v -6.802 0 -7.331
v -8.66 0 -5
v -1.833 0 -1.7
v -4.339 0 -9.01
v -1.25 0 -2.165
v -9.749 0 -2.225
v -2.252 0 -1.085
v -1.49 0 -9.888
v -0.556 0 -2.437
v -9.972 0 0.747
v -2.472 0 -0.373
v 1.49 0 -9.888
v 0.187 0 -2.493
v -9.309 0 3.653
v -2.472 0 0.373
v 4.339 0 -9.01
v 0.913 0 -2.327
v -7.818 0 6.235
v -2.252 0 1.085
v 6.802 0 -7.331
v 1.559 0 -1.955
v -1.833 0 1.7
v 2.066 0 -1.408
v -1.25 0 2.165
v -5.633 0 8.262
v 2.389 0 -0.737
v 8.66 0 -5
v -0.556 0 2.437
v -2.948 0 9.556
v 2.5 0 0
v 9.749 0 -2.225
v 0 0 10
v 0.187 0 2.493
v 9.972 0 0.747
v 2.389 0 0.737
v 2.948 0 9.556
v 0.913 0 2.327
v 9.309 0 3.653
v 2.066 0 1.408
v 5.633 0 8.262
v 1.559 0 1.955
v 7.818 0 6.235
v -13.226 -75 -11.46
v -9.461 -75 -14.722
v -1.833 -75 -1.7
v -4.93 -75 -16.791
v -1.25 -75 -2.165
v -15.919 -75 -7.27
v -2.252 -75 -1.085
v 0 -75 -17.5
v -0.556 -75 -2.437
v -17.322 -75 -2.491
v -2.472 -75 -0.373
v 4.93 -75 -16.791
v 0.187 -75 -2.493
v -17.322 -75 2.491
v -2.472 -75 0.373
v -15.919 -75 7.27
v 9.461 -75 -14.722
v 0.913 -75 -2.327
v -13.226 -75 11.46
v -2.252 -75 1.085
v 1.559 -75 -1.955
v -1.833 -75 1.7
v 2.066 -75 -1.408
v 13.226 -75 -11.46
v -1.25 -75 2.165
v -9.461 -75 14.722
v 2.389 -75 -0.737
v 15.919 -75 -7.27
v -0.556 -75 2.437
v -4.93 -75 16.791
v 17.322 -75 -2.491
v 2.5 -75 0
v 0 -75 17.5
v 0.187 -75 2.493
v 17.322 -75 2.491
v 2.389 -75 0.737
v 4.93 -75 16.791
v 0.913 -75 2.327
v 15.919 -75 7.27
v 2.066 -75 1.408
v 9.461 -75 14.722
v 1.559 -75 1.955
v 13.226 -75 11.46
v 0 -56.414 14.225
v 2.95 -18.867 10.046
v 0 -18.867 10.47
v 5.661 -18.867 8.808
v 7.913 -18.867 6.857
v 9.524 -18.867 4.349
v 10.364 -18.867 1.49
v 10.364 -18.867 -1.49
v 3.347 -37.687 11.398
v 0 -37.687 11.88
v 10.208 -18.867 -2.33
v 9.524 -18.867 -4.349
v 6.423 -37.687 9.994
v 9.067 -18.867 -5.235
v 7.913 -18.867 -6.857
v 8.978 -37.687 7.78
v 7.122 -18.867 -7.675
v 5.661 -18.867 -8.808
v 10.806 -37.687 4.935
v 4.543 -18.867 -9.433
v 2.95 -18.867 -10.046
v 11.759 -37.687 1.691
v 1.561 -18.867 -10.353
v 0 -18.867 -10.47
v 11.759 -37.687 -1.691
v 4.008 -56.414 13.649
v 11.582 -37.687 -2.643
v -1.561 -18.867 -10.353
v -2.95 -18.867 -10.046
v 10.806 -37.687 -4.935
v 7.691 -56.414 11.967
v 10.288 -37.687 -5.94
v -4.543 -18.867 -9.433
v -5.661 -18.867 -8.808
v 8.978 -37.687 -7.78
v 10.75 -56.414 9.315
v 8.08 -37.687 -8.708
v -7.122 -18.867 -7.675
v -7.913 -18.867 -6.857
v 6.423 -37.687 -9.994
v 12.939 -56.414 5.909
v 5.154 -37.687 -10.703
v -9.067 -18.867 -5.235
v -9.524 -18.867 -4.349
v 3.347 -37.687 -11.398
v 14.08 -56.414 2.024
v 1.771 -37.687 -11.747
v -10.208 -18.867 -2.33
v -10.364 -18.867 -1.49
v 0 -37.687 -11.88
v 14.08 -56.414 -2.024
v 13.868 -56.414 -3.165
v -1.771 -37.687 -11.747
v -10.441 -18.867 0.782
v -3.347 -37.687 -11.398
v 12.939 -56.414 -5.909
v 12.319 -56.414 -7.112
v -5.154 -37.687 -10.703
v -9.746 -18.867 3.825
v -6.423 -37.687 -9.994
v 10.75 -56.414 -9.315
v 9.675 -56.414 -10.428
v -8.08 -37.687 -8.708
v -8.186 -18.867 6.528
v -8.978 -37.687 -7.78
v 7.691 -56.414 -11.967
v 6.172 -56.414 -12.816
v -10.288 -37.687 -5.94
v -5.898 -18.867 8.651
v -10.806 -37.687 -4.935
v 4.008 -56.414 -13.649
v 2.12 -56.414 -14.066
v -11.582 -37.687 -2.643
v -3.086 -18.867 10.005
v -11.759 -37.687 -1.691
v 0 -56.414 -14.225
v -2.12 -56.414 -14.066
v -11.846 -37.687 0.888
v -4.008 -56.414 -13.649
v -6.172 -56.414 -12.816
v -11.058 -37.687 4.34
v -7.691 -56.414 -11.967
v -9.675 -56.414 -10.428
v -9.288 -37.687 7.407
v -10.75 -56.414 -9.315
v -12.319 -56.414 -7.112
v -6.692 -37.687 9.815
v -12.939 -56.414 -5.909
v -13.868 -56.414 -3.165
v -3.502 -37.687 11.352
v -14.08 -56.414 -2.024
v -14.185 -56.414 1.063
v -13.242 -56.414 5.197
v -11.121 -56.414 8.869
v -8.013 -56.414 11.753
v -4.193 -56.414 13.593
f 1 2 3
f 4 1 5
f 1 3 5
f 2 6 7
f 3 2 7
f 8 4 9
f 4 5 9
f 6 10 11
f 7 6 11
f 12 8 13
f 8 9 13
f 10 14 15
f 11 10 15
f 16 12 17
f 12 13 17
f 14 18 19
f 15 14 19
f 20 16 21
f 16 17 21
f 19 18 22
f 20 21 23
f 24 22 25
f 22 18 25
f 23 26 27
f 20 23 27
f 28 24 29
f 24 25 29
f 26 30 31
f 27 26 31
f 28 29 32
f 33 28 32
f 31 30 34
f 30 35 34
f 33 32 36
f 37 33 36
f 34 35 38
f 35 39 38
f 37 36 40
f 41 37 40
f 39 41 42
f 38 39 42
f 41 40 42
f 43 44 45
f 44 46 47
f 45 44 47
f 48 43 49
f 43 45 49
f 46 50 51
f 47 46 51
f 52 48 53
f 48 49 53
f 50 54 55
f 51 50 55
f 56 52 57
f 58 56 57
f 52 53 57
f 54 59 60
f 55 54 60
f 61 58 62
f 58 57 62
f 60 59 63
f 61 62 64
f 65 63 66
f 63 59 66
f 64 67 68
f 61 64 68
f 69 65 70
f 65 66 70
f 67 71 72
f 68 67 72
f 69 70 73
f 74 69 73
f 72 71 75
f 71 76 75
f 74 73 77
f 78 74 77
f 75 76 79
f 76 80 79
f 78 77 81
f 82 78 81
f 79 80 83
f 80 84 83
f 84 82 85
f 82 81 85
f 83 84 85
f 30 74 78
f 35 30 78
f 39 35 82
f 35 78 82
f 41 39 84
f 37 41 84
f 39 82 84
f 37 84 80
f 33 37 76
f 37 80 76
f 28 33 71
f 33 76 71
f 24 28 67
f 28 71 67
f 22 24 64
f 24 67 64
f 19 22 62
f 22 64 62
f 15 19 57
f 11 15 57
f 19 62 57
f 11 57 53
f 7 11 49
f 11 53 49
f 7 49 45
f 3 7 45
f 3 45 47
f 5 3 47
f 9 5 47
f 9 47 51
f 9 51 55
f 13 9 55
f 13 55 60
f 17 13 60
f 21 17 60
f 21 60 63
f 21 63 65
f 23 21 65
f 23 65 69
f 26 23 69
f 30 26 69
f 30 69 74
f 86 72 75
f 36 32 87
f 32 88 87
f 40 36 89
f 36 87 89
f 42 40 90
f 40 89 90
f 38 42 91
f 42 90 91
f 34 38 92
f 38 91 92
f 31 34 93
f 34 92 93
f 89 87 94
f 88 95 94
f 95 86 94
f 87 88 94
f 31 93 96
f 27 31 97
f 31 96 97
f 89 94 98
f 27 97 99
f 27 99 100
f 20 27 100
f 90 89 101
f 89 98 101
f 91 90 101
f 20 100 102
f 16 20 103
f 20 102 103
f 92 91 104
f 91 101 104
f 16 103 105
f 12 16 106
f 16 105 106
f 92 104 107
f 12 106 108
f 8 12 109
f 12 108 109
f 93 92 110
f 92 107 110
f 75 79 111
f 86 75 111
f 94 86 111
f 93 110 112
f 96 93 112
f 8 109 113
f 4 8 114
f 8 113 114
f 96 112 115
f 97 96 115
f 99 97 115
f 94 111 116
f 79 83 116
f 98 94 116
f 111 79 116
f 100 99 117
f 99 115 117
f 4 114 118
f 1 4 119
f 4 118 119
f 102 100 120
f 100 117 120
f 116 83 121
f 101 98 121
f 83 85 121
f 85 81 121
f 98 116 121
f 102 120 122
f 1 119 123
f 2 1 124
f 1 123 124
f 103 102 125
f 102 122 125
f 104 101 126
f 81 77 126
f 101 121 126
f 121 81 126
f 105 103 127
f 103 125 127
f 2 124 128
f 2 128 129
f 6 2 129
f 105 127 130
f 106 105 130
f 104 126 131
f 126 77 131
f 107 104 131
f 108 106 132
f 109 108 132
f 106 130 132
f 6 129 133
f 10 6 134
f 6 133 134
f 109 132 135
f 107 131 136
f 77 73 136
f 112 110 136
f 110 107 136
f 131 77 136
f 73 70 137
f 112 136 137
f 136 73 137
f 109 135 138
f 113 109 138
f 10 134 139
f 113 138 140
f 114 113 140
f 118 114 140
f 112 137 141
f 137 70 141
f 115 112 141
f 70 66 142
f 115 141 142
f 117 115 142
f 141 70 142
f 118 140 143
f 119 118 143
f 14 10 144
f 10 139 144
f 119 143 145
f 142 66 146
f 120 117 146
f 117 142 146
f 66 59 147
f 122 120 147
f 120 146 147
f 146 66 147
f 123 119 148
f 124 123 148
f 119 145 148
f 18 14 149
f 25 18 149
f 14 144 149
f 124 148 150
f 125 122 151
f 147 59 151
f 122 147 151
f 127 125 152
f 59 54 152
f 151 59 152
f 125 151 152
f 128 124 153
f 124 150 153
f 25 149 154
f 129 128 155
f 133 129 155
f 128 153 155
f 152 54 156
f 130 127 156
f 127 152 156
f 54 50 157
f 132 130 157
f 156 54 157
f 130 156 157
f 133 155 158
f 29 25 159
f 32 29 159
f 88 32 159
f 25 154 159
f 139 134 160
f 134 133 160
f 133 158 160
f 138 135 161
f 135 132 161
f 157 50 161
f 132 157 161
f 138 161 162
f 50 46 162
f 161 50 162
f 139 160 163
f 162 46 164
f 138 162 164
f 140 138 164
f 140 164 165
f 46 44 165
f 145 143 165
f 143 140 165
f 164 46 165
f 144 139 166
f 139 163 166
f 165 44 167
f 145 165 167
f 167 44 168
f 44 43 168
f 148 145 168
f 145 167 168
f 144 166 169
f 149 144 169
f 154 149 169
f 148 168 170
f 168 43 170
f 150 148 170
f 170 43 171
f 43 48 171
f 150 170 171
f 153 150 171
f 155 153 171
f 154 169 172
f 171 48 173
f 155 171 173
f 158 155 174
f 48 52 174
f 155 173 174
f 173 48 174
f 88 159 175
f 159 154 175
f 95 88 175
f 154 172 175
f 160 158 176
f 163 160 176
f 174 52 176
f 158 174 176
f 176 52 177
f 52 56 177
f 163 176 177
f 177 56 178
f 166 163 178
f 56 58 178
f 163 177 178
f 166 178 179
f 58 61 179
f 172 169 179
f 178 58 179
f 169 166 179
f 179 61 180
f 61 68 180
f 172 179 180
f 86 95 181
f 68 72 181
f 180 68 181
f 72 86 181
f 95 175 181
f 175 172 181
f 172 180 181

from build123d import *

# Parameters (mm, degrees)
F2_R     = 2.5
F7_DEPTH = 150.001
F8_R     = 25
F9_DEPTH = 75.001


with BuildPart() as f6:
    # F5 (on Right) → F6 (revolve)
    with BuildSketch(Plane.YZ):
        with BuildLine():
            Line((-75, 17.5), (-75, 0))
            Line((-75, 0), (0, 0))
            Line((0, 0), (0, 10))
            ThreePointArc((0, 10), (-37.687034, 11.879664), (-75, 17.5))
        make_face()
        with BuildLine():
            Line((0, 10), (0, 0))
            Line((0, 0), (75, 0))
            Line((75, 0), (75, 17.5))
            ThreePointArc((75, 17.5), (37.687034, 11.879664), (0, 10))
        make_face()
    revolve(axis=Axis((0, 0, 0), (0, 1, 0)))

    # F2 (on offset) → F7 (cut, through all)
    with BuildSketch(Plane.XZ.offset(75)):
        Circle(F2_R)
    extrude(amount=-F7_DEPTH, mode=Mode.SUBTRACT)

    # F8 (on Front) → F9 (cut, through all)
    with BuildSketch(Plane.XZ):
        Circle(F8_R)
    extrude(amount=-F9_DEPTH, mode=Mode.SUBTRACT)


solid = f6.part
